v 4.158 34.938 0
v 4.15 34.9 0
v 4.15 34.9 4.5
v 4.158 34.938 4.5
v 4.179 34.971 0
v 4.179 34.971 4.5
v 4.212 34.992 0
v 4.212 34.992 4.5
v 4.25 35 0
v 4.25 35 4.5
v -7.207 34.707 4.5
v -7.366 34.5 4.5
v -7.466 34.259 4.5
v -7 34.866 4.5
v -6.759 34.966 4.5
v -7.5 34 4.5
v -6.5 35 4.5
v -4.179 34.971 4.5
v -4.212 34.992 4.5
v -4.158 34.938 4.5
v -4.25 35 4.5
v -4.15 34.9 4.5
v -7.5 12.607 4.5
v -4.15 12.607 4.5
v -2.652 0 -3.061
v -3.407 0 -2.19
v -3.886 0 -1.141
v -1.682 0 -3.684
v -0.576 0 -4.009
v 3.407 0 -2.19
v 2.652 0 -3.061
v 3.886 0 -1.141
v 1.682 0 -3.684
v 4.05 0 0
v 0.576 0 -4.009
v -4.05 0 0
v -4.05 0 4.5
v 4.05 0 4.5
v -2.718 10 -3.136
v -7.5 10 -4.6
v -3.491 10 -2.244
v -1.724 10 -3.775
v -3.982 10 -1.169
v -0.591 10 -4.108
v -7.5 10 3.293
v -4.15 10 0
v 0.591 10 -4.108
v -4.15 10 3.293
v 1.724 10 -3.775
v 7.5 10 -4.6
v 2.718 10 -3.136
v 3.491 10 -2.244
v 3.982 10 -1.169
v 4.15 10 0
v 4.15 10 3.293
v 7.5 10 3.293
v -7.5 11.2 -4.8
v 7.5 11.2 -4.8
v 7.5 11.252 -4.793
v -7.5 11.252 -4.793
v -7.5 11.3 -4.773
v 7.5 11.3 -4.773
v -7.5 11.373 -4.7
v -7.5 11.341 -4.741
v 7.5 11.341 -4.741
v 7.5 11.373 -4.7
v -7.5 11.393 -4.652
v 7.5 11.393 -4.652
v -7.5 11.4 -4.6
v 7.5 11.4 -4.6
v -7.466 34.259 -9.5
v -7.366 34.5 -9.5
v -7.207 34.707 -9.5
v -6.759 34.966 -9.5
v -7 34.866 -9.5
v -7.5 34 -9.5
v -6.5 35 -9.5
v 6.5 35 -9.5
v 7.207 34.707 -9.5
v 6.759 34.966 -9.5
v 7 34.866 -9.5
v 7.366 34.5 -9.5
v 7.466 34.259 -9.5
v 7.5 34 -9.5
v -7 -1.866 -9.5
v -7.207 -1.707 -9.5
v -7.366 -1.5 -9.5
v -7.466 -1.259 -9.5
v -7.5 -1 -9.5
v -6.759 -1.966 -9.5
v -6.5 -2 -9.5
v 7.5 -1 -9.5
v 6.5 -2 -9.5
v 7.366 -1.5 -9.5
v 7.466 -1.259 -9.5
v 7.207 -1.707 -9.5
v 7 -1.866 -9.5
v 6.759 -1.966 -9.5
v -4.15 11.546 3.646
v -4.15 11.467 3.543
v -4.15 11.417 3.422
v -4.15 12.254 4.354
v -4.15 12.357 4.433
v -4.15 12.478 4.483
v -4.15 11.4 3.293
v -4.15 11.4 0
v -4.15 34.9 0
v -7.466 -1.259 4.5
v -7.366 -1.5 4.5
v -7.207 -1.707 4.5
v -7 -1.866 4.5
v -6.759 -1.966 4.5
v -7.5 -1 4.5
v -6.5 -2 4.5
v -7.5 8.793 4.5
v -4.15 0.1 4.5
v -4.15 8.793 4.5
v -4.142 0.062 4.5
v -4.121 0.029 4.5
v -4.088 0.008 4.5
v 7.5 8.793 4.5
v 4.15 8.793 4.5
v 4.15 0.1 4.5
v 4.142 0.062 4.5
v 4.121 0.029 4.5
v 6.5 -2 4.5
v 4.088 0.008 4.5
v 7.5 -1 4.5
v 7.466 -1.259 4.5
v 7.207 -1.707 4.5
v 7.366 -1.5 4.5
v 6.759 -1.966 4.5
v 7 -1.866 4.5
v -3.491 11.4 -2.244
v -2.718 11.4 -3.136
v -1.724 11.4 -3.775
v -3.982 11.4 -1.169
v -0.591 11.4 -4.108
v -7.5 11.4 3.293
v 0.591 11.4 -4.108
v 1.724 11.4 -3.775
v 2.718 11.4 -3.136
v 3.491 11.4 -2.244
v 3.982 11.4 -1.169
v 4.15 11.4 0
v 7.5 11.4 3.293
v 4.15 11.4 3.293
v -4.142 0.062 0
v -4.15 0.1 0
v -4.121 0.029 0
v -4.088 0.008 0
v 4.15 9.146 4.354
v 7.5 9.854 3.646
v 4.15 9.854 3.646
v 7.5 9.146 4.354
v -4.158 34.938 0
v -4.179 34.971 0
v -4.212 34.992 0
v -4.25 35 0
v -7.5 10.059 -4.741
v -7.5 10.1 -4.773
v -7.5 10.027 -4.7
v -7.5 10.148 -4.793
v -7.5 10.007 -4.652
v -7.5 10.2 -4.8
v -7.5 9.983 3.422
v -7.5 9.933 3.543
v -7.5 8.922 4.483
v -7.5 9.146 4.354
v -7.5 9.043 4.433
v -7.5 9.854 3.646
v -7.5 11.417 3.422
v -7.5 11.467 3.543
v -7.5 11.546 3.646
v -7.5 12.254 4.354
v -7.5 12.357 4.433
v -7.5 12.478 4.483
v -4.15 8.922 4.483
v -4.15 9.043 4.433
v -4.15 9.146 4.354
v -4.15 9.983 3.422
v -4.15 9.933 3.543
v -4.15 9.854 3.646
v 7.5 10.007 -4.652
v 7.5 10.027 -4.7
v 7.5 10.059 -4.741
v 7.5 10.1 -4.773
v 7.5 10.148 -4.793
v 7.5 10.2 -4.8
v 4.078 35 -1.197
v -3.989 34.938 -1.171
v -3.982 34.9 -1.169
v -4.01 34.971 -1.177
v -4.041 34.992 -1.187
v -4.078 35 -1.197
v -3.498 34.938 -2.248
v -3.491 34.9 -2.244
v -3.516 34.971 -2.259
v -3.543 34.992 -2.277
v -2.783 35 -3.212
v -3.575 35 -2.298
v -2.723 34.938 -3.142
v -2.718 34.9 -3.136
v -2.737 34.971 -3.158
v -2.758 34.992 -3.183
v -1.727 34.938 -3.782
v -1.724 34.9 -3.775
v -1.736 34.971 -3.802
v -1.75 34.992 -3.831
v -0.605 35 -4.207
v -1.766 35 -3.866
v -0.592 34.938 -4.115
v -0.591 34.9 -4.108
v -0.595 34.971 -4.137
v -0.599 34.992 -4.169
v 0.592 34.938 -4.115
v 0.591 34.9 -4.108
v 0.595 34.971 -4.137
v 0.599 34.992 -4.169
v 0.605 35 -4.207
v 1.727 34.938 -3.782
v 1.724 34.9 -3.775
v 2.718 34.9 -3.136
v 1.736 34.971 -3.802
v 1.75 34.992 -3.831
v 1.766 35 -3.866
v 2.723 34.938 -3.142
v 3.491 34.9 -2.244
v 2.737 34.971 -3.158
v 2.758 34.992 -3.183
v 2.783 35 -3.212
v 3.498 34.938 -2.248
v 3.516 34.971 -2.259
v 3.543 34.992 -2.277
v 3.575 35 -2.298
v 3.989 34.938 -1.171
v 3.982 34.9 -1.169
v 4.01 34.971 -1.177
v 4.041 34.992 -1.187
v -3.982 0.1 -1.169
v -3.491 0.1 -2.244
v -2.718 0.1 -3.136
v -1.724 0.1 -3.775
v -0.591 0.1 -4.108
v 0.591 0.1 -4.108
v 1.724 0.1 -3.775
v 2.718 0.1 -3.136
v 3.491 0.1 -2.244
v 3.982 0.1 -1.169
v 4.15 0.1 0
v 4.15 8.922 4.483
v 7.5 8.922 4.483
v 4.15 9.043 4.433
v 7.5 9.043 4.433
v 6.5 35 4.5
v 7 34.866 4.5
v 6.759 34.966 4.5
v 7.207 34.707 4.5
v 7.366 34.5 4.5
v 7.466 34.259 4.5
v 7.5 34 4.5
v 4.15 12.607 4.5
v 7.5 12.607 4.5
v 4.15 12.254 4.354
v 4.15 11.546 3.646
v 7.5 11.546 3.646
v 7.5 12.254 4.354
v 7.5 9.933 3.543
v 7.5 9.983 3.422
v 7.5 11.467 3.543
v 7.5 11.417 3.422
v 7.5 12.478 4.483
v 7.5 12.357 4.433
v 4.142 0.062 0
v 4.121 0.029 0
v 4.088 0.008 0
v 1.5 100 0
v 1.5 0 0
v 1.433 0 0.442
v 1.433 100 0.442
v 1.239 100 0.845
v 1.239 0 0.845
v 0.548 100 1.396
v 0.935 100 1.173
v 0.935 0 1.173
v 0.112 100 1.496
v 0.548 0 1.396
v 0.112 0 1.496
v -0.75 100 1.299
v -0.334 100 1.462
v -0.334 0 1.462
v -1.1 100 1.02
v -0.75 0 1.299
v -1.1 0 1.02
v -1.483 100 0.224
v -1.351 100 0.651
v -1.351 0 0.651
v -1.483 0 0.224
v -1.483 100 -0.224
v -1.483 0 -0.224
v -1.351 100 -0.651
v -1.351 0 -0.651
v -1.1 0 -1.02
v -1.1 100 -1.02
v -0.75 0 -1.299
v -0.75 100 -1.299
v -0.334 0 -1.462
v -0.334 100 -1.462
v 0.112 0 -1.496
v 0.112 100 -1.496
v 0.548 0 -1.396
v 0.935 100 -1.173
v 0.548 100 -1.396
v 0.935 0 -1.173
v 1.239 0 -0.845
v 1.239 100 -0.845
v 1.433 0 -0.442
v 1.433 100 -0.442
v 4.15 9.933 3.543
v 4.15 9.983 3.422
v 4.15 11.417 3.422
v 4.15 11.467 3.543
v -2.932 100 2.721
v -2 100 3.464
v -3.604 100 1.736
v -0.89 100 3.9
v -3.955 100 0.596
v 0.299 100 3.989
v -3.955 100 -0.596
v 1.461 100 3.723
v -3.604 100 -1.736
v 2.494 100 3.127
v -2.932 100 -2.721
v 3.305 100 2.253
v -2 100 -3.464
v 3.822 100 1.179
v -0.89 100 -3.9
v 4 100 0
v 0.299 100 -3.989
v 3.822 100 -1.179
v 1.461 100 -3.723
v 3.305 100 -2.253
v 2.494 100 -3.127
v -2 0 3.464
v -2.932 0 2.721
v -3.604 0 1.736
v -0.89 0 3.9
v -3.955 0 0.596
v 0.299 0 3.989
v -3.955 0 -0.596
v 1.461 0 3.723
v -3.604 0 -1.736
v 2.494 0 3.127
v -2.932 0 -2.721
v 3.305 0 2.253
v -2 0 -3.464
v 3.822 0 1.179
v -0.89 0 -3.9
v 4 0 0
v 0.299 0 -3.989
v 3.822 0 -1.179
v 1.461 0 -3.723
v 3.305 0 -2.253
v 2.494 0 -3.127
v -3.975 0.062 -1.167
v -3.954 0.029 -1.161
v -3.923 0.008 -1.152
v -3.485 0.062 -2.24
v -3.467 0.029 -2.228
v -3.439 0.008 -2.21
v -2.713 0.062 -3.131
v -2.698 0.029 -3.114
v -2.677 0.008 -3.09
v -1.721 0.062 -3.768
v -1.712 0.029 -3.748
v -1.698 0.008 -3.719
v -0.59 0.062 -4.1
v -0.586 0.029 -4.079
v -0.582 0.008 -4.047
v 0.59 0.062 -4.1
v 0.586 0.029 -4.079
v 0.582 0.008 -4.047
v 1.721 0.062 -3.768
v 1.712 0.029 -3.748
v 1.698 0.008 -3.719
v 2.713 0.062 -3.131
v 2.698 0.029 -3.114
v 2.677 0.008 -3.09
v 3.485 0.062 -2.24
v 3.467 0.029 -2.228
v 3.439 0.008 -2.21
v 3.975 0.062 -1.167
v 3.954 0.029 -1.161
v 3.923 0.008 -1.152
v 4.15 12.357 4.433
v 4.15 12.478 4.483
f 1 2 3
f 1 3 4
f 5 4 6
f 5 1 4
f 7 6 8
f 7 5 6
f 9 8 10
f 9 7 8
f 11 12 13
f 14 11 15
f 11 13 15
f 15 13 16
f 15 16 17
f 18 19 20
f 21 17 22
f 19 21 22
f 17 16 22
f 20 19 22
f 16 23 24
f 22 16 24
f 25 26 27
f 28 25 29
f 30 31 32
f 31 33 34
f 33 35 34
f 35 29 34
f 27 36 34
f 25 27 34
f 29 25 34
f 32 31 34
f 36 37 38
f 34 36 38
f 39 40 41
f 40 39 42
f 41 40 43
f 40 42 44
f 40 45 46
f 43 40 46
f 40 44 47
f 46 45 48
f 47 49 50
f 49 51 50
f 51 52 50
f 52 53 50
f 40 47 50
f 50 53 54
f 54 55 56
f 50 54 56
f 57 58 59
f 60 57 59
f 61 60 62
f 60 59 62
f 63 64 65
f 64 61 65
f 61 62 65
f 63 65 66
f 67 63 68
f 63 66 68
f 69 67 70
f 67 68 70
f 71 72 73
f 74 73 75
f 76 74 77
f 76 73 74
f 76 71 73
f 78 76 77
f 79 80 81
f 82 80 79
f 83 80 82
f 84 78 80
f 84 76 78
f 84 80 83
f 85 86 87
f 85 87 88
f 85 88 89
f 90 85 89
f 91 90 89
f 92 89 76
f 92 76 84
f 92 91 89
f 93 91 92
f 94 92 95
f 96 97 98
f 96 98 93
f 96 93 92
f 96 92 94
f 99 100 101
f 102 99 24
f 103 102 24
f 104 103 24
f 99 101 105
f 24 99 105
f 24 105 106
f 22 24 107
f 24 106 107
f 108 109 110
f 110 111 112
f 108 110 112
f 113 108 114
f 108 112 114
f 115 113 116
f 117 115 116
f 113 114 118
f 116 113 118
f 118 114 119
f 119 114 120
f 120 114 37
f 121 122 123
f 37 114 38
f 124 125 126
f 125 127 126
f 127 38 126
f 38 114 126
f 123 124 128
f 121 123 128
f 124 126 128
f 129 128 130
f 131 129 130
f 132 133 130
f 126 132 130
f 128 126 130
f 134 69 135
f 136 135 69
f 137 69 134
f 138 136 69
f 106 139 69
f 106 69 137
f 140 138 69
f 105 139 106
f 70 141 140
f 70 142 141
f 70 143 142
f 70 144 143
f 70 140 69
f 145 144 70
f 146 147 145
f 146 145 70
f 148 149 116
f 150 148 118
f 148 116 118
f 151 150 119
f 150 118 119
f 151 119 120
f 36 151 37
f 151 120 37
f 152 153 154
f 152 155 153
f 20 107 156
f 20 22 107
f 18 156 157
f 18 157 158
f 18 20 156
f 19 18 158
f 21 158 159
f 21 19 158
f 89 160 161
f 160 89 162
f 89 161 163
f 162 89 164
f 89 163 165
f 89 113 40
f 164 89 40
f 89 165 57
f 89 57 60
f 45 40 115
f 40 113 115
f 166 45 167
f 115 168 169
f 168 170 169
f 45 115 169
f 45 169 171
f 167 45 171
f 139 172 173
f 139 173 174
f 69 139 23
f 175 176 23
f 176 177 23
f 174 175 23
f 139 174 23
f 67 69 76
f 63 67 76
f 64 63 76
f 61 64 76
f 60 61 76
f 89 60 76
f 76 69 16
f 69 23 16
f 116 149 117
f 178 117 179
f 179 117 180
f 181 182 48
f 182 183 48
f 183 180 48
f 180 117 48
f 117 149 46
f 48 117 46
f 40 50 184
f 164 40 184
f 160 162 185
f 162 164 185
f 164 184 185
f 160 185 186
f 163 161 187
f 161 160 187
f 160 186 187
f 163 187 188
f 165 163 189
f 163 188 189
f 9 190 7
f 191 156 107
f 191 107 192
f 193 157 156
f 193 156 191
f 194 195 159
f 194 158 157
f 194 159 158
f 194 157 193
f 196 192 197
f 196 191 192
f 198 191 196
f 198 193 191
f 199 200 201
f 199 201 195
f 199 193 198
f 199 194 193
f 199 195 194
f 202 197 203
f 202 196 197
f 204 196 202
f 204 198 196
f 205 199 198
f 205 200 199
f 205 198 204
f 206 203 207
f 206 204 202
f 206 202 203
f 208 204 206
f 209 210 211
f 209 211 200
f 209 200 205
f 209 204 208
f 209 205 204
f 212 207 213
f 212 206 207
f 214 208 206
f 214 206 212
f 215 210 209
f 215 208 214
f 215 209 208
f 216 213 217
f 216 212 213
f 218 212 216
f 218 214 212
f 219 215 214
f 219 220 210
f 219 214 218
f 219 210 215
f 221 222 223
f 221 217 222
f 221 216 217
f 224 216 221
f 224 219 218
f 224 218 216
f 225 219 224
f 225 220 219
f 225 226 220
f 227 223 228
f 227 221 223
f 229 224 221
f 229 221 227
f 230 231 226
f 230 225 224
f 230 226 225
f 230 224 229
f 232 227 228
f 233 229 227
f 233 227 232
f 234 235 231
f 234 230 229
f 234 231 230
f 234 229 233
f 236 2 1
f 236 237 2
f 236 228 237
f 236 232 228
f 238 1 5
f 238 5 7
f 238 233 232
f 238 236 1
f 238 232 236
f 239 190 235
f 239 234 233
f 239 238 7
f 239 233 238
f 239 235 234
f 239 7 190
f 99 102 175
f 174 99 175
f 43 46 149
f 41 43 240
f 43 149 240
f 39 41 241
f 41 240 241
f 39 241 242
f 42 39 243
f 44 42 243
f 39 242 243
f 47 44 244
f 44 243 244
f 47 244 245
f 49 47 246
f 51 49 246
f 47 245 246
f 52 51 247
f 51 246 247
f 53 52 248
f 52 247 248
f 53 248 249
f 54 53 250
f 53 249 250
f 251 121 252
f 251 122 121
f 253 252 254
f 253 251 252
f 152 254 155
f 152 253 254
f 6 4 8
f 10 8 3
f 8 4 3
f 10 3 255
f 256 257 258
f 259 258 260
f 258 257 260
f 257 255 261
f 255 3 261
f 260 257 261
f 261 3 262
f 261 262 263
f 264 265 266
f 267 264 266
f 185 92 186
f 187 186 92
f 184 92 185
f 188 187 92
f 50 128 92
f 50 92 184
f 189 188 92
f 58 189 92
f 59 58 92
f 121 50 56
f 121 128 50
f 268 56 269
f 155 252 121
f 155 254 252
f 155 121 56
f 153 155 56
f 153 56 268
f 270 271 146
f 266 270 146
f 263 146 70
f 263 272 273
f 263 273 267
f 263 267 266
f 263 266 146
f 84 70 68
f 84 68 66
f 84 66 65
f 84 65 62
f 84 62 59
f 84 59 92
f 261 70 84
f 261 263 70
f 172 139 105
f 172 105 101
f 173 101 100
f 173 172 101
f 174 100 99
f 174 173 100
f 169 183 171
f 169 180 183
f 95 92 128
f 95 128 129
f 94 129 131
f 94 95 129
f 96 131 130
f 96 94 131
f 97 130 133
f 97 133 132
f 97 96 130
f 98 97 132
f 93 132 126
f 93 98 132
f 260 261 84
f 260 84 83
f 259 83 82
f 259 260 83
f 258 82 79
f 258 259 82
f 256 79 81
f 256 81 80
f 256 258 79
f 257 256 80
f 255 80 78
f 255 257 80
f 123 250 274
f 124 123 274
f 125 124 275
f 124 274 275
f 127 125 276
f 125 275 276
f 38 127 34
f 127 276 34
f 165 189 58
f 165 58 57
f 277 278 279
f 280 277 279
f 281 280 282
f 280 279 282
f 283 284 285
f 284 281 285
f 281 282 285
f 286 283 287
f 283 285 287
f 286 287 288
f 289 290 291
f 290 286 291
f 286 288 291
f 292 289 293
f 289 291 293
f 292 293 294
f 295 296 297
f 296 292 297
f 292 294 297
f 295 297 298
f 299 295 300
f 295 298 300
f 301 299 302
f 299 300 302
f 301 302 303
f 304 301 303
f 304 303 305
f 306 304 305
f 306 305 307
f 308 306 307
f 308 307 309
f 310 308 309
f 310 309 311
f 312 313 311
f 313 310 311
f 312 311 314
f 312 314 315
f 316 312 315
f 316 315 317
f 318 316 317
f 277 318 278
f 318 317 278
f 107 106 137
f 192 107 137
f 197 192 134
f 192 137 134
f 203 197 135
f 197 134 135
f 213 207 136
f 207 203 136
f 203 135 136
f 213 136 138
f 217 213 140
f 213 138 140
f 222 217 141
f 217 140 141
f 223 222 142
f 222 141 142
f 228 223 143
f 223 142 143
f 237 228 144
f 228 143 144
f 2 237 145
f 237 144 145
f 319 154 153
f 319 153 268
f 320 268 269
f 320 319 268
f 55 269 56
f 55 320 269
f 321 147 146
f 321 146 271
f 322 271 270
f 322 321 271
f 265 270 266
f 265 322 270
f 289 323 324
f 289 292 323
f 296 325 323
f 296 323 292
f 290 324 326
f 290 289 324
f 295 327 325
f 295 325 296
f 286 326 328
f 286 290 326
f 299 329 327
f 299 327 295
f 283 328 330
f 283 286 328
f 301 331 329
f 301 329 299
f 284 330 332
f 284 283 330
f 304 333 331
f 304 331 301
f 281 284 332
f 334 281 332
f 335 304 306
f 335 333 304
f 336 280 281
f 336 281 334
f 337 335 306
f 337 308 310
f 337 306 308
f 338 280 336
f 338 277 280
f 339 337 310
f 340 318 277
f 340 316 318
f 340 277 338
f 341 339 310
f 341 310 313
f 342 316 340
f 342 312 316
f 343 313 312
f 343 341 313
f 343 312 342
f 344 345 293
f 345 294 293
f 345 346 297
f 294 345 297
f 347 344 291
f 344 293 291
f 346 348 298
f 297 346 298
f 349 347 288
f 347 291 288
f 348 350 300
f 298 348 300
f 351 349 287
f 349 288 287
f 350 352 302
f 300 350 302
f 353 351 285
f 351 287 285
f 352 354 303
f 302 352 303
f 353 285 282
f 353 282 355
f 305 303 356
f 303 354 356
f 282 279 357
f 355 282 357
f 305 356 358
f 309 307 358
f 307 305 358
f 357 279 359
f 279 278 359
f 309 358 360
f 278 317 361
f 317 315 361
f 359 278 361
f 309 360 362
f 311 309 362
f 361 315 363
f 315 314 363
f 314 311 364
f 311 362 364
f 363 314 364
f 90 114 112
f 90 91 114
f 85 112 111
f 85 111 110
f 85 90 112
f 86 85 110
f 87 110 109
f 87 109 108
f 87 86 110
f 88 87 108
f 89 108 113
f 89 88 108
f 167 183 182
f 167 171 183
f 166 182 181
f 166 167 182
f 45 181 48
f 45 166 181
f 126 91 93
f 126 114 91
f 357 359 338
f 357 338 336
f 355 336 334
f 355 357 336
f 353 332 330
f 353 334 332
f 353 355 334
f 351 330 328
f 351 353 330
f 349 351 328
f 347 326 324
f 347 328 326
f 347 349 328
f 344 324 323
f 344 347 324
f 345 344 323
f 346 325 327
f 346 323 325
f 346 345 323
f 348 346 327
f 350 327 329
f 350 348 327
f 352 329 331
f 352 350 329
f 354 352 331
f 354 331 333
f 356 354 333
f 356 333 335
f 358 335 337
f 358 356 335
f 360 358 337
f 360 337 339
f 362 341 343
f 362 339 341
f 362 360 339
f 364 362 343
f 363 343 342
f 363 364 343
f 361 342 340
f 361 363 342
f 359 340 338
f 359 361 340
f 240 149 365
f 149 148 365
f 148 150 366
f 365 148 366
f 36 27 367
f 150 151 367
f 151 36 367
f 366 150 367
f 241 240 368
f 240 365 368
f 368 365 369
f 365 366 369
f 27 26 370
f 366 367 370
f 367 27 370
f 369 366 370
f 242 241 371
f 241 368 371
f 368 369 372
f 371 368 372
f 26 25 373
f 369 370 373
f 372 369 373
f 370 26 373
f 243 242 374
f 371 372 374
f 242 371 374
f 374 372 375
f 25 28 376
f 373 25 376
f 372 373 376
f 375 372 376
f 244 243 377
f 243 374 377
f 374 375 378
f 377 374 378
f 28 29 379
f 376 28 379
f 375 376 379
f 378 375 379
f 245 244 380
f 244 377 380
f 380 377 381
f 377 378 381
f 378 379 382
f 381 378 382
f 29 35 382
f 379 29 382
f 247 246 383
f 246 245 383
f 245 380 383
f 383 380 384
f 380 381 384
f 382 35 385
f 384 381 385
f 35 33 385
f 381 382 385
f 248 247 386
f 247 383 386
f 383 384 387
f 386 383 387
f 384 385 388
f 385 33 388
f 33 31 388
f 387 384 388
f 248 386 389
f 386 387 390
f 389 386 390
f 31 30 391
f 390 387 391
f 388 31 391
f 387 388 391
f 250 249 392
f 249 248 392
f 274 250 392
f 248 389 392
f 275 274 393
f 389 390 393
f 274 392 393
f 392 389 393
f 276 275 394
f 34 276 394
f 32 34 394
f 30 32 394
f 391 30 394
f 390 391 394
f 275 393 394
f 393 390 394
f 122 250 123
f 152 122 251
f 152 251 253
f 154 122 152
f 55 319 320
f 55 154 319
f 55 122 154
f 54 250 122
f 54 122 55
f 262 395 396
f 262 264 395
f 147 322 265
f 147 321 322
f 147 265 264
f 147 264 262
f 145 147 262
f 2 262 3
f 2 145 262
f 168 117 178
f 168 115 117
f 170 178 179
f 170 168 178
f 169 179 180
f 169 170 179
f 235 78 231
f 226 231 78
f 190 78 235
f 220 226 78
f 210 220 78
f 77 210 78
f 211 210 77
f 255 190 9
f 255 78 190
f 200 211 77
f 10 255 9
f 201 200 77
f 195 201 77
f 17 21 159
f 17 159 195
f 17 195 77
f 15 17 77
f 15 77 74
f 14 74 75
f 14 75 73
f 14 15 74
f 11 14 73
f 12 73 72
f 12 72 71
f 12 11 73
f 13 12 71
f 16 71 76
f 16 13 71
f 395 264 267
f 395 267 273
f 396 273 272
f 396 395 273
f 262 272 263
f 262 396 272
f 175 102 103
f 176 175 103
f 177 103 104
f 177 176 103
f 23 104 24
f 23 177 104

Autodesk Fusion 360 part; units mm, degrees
sketch "Sketch1" plane through (0, 0, 0) normal (0, 1, 0) x (1, 0, 0)
  circle A0 centre (0, 0) radius 4
  circle A1 centre (0, 0) radius 1.5
  dimension "d1" = 8
  dimension "d2" = 3
extrude "Extrude1" add sketch "Sketch1" along normal blind 100 makes body 1
sketch "Sketch2" plane through (0, 0, 0) normal (0, 1, 0) x (1, 0, 0)
  circle A0 centre (0, 0) radius 4.15
  line L0 (0, 0) -> (7.5, 0)
  line L1 (7.5, 0) -> (7.5, -7.5)
  line L2 (7.5, -7.5) -> (0, -7.5)
  line L3 (0, -7.5) -> (0, 0)
  line L4 (0, 0) -> (-7.5, 0)
  line L5 (-7.5, 0) -> (-7.5, 7.5)
  line L6 (-7.5, 7.5) -> (0, 7.5)
  line L7 (0, 7.5) -> (0, 0)
  line L8 (-7.5, 7.5) -> (7.5, 7.5)
  line L9 (7.5, 7.5) -> (7.5, -7.5)
  line L10 (7.5, -7.5) -> (-7.5, -7.5)
  line L11 (-7.5, -7.5) -> (-7.5, 7.5)
  dimension "d5" = 8.3
  dimension "d6" = 7.5
  dimension "d7" = 7.5
  dimension "d8" = 7.5
extrude "Extrude2" add sketch "Sketch2" along normal blind 35 separate body contours A0 L0 L7 L8 L9 | A0 L4 L5 L6 L7 L8 L11 makes body 2
extrude "Extrude3" add 2 faces at (5.2667, 11.6667, 0) (-5.2667, 23.3333, 0) along direction (0, 0, 1) blind 4.5 on bodies 2 bodies 2
sketch "Sketch3" plane through (0, 0, 0) normal (0, -1, 0) x (1, 0, 0)
  arc A0 (-4.15, 0) -> (4.15, 0) centre (0, 0) ccw
  line L0 (-4.15, 0) -> (-4.15, 4.5)
  line L1 (-4.15, 4.5) -> (-7.5, 4.5)
  line L2 (-7.5, 4.5) -> (-7.5, -7.5)
  line L3 (-7.5, -7.5) -> (7.5, -7.5)
  line L4 (7.5, -7.5) -> (7.5, 4.5)
  line L5 (7.5, 4.5) -> (4.15, 4.5)
  line L6 (4.15, 4.5) -> (4.15, 0)
  line L7 (7.5, -7.5) -> (-7.5, -7.5)
  line L8 (-7.5, -7.5) -> (-7.5, 4.5)
  line L9 (-7.5, 4.5) -> (7.5, 4.5)
  line L10 (7.5, 4.5) -> (7.5, -7.5)
extrude "Extrude4" add sketch "Sketch3" along normal blind 2 bodies 2
sketch "Sketch4" plane through (0, 0, 4.5) normal (0, 0, 1) x (-1, 0, 0)
  line L0 (4.15, 0) -> (4.15, -35)
  line L1 (4.15, -35) -> (7.5, -35)
  line L2 (7.5, -35) -> (7.5, 2)
  line L3 (7.5, 2) -> (-7.5, 2)
  line L4 (-7.5, 2) -> (-7.5, -35)
  line L5 (-7.5, -35) -> (-4.15, -35)
  line L6 (-4.15, -35) -> (-4.15, 0)
  line L7 (-4.15, 0) -> (4.15, 0)
  line L8 (4.15, 0) -> (4.15, -10)
  line L9 (7.5, -10) -> (-7.5, -10)
  line L10 (-7.5, -10) -> (-7.5, -11.4)
  line L11 (-7.5, -11.4) -> (7.5, -11.4)
  line L12 (7.5, -11.4) -> (7.5, -10)
  dimension "d15" = 10
  dimension "d16" = 15
  dimension "d17" = 1.4
extrude "Extrude5" cut sketch "Sketch4" against normal blind 9 contours L0 L2 L9 L11 L12 | L0 L6 L9 L11 | L4 L6 L9 L10 L11 bodies 2
extrude "Extrude6" cut 1 faces at (-2.5, 10.9333, -4.5) along direction (0, 0, -1) blind 0.3 on bodies 2 bodies 2
extrude "Extrude7" add 1 faces at (-2.5, 10.3333, -7.5) along direction (0, 0, -1) blind 2 on bodies 2 bodies 2
chamfer "Chamfer1" distance 1 angle 45 4 edges at (-5.825, 11.4, 4.5) (-5.825, 10, 4.5) (5.825, 11.4, 4.5) (5.825, 10, 4.5) on bodies 2
fillet "Fillet1" radius 1 4 edges at (7.5, -2, -2.5) (-7.5, -2, -2.5) (7.5, 35, -2.5) (-7.5, 35, -2.5) on bodies 2
fillet "Fillet2" radius 0.5 8 edges at (5.825, 9, 4.5) (5.825, 10, 3.5) (5.825, 11.4, 3.5) (5.825, 12.4, 4.5) (-5.825, 12.4, 4.5) (-5.825, 11.4, 3.5) (-5.825, 10, 3.5) (-5.825, 9, 4.5) on bodies 2
fillet "Fillet3" radius 0.2 2 edges at (0, 11.4, -4.8) (0, 10, -4.8) on bodies 2
fillet "Fillet4" radius 0.1 3 edges at (-4.15, 0, 2.25) (0, 0, -4.15) (4.15, 0, 2.25) on bodies 2
fillet "Fillet5" radius 0.1 3 edges at (-4.15, 35, 2.25) (0, 35, -4.15) (4.15, 35, 2.25) on bodies 2
